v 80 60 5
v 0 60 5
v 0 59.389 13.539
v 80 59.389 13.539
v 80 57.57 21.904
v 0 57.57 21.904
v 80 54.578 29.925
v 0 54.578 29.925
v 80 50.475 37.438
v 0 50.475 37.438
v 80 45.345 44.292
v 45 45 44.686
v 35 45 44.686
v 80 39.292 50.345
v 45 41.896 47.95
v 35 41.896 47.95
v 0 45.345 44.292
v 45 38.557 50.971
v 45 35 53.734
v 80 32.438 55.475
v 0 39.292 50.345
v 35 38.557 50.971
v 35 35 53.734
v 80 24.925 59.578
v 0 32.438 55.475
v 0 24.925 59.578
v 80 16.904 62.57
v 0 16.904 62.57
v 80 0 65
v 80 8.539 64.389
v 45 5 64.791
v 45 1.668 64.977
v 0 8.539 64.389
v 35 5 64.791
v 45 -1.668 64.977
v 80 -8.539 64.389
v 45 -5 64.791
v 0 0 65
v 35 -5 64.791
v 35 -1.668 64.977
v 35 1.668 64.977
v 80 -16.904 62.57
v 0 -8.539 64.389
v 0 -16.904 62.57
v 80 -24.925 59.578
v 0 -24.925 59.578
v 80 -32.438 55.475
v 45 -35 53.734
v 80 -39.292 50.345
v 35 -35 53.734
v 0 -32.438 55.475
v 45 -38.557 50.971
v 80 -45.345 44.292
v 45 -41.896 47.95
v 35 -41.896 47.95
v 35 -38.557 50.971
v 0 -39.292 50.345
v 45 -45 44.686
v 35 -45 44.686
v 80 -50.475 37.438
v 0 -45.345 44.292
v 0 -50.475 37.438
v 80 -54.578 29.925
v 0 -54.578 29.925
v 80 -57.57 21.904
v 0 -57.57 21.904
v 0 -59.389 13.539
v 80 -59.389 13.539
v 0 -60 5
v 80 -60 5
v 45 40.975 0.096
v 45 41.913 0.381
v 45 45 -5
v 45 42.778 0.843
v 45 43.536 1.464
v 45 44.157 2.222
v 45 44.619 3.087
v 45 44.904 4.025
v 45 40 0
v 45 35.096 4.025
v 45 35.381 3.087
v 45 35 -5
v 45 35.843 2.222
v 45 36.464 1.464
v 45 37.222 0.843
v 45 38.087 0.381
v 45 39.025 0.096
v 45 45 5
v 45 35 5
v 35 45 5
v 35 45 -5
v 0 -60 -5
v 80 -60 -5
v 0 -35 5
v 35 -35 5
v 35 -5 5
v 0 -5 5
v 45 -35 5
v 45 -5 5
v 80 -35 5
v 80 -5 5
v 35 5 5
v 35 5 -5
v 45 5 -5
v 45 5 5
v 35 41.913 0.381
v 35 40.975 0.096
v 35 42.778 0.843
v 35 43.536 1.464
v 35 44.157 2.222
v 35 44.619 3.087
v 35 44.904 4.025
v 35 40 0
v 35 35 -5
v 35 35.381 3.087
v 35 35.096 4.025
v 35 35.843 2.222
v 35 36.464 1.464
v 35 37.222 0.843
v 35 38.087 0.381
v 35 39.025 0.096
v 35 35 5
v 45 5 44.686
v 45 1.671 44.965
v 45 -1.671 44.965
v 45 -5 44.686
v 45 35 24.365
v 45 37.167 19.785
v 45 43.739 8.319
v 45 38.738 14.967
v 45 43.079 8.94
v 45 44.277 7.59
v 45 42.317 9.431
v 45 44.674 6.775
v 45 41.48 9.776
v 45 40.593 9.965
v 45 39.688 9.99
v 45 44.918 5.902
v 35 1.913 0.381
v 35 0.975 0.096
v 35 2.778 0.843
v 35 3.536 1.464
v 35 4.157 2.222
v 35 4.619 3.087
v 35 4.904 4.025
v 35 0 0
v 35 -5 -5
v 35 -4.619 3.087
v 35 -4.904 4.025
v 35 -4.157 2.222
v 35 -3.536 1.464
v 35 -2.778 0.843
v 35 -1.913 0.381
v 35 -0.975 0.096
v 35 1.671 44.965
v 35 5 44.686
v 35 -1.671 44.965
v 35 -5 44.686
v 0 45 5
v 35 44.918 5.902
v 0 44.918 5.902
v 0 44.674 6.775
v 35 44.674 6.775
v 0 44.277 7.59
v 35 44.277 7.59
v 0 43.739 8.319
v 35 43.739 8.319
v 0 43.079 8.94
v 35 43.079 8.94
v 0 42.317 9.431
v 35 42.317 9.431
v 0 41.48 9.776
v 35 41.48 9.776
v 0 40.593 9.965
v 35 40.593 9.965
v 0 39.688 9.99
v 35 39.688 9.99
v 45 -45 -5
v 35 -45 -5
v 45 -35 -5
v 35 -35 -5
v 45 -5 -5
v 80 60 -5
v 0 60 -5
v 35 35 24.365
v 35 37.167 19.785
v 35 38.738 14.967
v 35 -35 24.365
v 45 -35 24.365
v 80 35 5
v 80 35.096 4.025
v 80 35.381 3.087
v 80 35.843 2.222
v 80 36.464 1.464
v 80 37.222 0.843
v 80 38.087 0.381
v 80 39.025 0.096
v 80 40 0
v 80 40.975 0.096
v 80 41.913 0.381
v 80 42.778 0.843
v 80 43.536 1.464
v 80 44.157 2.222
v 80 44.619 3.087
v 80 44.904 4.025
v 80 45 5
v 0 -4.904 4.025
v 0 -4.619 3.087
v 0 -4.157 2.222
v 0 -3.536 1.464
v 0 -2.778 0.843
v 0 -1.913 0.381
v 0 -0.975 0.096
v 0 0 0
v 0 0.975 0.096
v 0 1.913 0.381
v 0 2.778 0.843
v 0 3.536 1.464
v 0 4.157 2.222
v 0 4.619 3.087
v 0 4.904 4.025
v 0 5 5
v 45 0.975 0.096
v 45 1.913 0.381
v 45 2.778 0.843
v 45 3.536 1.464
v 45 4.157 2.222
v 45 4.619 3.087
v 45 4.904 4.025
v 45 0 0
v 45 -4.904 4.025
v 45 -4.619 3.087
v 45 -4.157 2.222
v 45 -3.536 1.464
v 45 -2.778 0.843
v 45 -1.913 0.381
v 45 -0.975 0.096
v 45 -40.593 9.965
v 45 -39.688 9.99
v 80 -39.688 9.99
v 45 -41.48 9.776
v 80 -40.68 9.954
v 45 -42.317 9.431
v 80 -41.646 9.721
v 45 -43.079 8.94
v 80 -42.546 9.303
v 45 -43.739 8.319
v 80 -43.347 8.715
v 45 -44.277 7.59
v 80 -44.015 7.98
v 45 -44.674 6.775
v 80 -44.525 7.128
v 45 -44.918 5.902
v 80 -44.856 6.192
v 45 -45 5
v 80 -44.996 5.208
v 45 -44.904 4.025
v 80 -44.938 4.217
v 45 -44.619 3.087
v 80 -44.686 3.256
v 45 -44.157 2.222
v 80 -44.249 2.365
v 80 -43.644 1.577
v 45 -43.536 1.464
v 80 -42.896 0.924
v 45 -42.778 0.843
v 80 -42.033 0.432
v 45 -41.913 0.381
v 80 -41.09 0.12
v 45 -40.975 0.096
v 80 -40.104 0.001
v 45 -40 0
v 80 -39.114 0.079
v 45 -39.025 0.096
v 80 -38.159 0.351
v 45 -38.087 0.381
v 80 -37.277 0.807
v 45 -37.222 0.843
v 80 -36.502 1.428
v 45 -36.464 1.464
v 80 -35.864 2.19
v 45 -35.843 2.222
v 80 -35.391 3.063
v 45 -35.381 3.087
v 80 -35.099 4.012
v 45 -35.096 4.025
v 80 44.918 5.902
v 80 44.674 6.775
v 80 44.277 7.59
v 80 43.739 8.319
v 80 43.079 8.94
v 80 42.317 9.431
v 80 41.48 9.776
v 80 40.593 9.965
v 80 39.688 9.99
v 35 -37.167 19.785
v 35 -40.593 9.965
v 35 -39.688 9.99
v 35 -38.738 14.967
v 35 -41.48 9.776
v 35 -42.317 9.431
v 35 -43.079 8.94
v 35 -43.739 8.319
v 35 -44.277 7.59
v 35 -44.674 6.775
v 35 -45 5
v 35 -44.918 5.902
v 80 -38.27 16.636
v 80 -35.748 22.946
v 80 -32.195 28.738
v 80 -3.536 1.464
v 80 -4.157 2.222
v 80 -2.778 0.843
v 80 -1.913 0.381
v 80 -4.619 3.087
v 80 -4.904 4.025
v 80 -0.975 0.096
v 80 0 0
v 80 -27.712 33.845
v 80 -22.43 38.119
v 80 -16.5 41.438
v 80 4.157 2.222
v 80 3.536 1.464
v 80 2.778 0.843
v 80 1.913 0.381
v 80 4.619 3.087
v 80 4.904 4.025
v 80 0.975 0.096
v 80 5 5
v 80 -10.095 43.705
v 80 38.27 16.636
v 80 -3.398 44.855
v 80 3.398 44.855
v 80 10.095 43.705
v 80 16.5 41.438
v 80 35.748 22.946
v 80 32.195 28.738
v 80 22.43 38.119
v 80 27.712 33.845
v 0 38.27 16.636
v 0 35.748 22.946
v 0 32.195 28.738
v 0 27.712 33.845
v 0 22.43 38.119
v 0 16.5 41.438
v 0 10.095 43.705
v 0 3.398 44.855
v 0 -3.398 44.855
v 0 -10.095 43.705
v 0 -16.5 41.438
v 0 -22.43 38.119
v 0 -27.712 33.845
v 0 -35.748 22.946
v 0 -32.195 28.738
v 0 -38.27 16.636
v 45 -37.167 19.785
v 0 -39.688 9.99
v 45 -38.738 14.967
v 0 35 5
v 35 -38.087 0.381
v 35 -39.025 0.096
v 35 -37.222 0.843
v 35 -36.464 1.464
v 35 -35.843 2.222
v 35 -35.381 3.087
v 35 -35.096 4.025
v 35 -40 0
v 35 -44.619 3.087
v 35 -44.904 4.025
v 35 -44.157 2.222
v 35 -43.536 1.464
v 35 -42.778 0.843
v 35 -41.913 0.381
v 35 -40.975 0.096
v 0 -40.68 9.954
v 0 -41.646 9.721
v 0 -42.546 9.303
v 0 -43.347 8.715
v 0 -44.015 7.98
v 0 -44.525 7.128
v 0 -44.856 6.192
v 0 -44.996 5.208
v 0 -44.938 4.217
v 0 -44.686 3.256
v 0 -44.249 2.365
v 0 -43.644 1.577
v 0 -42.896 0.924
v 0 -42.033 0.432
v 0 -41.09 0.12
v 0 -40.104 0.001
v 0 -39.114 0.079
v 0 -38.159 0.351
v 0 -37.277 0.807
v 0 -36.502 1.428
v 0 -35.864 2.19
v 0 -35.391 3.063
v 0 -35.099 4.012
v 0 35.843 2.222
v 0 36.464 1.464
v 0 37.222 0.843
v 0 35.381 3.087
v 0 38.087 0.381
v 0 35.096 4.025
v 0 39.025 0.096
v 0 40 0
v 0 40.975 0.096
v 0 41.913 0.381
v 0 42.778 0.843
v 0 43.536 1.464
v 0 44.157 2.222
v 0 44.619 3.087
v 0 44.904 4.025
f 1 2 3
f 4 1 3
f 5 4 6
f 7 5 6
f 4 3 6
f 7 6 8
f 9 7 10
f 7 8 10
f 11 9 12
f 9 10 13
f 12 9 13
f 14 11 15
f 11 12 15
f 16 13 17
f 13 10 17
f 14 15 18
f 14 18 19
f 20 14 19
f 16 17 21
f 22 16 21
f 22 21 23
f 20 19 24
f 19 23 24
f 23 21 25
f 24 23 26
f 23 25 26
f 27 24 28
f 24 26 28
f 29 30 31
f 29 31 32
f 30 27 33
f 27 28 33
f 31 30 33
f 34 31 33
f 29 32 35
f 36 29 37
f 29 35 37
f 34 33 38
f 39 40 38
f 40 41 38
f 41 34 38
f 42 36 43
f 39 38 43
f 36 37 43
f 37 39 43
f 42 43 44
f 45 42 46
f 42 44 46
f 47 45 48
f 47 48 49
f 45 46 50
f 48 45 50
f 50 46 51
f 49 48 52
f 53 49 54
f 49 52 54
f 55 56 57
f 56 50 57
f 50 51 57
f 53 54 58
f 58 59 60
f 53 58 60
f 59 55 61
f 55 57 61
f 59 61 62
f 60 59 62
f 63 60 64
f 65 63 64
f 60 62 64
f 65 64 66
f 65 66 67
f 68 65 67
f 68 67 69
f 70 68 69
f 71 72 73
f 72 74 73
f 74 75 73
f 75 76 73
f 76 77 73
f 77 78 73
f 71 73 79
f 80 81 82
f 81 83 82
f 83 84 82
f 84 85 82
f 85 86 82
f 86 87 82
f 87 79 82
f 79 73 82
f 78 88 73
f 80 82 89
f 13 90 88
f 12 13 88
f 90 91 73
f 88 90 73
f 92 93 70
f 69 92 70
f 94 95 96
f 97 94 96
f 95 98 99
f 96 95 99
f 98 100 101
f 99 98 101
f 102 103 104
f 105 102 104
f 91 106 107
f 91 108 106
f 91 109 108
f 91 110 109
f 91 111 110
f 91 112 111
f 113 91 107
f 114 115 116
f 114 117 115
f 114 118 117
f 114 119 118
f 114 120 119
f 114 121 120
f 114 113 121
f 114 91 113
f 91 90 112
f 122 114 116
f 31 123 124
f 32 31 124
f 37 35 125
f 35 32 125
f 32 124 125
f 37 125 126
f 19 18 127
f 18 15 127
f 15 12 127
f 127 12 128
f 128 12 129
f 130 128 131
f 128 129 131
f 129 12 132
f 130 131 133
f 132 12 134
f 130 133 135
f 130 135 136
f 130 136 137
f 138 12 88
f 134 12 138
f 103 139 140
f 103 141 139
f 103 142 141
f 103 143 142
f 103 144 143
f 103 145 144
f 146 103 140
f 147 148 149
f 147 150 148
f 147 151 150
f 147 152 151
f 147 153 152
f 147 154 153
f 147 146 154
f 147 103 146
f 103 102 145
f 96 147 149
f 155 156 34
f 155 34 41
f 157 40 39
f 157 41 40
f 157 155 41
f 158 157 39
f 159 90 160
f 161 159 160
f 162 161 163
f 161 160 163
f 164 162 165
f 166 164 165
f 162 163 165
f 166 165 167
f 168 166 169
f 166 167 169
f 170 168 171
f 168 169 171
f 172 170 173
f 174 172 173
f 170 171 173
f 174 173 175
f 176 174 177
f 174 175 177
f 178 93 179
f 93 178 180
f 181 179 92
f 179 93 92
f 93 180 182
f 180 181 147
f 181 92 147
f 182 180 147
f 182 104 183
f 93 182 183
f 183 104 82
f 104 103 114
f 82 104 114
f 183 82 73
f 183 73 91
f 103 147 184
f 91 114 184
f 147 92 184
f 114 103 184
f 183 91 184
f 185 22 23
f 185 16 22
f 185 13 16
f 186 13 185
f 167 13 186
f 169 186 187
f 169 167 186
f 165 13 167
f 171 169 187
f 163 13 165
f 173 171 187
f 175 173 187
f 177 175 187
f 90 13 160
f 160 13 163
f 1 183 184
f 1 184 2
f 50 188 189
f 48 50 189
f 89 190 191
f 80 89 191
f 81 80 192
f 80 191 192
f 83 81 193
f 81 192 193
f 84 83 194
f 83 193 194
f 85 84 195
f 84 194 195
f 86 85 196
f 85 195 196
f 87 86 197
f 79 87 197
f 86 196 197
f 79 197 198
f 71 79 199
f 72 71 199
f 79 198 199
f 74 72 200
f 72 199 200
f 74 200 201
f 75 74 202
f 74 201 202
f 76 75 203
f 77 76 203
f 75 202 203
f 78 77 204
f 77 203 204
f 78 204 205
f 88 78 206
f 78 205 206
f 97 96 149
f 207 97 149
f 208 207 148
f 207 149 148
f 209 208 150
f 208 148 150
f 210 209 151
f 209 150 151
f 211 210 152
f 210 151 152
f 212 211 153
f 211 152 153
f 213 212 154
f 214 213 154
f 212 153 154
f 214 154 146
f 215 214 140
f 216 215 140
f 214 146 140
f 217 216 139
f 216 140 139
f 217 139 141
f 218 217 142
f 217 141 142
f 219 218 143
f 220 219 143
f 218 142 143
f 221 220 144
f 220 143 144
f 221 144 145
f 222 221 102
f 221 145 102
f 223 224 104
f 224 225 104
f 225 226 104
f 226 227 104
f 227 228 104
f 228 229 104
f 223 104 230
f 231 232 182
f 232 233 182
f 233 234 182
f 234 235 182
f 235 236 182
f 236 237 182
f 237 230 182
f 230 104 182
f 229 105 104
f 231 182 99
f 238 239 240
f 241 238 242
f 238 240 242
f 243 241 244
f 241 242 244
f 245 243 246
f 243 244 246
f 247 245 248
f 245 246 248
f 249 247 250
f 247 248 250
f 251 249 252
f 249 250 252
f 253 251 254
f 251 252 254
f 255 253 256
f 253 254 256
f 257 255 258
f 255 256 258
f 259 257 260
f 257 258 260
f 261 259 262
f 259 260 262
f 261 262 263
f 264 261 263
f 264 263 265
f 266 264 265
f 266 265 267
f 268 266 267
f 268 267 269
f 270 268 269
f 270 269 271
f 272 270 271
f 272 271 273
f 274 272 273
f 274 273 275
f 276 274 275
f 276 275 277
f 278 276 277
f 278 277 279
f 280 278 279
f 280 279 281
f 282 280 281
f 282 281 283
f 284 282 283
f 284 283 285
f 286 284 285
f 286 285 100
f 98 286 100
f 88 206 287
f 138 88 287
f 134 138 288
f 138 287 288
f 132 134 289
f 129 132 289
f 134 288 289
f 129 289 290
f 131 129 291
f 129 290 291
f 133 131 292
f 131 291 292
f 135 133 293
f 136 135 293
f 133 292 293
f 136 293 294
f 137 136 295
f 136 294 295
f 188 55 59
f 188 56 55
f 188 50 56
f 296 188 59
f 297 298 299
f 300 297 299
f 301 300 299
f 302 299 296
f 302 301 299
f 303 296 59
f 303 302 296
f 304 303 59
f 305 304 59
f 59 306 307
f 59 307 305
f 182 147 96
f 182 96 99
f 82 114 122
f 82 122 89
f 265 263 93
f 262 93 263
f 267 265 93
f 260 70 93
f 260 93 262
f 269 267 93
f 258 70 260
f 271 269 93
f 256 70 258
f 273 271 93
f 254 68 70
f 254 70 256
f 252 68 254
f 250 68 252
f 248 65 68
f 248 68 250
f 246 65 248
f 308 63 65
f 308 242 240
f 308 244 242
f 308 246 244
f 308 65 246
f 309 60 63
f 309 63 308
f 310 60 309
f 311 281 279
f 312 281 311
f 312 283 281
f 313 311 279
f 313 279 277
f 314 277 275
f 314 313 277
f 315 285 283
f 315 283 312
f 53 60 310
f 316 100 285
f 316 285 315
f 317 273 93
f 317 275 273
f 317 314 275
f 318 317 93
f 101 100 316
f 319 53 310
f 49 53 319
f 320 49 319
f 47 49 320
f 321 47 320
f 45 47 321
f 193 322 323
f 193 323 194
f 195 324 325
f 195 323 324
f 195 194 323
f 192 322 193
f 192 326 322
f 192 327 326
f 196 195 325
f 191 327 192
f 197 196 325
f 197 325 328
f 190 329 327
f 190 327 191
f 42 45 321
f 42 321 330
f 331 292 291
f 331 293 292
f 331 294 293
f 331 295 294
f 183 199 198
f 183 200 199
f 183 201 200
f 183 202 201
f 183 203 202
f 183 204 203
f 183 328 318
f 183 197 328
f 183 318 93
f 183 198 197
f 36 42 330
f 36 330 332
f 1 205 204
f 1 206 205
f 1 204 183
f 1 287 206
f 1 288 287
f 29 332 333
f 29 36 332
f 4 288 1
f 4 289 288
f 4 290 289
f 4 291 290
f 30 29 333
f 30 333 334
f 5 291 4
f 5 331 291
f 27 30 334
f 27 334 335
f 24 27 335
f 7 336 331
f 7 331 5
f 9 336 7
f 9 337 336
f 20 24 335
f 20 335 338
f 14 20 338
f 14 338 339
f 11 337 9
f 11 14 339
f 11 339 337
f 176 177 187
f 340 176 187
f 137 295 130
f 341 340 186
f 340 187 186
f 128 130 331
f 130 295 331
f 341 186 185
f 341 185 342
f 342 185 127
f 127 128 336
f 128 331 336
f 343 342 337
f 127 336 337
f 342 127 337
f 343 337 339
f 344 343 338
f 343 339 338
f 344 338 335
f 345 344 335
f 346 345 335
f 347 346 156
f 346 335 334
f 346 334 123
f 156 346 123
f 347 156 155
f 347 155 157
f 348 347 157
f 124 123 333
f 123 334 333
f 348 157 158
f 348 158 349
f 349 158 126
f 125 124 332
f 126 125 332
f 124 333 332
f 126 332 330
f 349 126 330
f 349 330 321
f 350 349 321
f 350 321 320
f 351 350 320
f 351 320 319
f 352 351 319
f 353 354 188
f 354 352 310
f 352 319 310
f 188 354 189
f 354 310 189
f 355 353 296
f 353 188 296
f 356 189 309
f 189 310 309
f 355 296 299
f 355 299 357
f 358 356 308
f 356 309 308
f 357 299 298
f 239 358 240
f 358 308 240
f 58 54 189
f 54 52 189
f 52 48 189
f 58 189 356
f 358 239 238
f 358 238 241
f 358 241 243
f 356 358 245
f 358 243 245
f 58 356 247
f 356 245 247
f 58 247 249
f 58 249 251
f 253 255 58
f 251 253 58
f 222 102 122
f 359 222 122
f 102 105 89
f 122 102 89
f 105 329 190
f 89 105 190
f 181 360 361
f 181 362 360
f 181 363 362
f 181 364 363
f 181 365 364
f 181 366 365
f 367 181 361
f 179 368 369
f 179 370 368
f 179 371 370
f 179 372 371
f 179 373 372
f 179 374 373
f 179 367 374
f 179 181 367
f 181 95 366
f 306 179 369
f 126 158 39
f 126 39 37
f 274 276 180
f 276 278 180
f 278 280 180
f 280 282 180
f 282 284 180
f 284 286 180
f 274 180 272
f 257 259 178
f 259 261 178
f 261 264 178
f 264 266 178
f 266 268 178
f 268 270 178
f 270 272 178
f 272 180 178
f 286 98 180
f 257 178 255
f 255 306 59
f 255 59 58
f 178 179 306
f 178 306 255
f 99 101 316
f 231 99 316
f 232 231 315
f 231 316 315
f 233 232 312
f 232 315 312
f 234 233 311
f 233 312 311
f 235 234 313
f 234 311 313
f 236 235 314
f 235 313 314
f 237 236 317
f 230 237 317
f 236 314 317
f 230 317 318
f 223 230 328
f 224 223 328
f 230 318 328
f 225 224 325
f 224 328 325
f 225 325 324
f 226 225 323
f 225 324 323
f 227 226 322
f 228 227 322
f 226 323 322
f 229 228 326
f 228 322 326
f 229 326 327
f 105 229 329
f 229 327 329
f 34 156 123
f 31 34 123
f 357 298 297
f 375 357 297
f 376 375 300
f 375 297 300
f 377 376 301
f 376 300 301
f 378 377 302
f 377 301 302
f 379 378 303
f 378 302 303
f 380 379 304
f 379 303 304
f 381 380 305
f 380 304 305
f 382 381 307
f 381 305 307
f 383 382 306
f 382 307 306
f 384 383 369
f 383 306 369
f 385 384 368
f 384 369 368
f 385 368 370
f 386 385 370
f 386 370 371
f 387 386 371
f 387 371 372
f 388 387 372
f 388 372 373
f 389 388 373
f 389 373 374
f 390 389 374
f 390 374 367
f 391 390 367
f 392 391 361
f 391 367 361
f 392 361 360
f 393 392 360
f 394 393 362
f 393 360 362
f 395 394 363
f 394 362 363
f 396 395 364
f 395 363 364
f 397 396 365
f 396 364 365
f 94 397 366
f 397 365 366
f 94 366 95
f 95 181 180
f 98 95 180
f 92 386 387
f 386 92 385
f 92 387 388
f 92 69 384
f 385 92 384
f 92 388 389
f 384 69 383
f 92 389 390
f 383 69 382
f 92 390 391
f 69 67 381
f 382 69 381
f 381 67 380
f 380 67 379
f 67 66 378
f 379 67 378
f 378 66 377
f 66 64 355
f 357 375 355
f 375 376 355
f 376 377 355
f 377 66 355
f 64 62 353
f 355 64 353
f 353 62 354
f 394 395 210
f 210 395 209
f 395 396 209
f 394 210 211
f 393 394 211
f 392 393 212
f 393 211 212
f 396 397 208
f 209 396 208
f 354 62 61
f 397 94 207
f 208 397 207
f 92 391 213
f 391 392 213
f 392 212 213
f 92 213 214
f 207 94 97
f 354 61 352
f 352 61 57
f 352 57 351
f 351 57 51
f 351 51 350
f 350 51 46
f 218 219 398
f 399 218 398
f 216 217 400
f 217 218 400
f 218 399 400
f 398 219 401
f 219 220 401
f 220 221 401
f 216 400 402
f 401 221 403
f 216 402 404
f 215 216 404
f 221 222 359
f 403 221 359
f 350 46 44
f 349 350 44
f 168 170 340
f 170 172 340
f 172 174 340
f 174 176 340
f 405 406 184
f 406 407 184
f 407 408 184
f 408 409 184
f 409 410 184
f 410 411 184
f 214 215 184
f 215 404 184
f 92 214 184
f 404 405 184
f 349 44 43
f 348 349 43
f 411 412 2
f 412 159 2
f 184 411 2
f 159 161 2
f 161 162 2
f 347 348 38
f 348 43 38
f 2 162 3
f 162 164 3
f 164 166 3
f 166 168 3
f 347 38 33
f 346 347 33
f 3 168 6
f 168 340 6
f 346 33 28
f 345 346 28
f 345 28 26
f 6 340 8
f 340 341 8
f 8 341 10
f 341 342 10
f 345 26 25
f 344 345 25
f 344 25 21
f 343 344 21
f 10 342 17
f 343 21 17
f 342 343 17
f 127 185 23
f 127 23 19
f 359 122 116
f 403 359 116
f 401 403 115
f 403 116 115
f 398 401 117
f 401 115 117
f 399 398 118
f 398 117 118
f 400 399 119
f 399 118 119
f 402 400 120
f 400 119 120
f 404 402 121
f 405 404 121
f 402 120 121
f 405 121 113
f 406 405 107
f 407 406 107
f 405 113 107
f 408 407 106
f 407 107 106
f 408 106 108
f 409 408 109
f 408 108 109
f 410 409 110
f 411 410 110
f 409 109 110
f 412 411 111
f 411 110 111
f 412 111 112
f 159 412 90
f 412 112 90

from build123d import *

# Parameters (mm, degrees)
F0_W     = 120
F0_H     = 10
F1_DEPTH = 80
F3_DEPTH = 80.001
F4_DEPTH = 25
F5_W     = 10
F5_H     = 10
F6_DEPTH = 70.001


with BuildPart() as f1:
    # F0 (on Right) → F1 (new body)
    with BuildSketch(Plane.YZ):
        Rectangle(F0_W, F0_H)
        with BuildLine():
            ThreePointArc((60, 5), (0, 65), (-60, 5))
            Line((-60, 5), (60, 5))
        make_face()
    extrude(amount=F1_DEPTH)

    # F2 (on face) → F3 (cut, through all)
    with BuildSketch(Plane.YZ.offset(80)):
        with BuildLine():
            Line((-5, 5), (5, 5))
            ThreePointArc((5, 5), (0, 10), (-5, 5))
        make_face()
        with BuildLine():
            ThreePointArc((-5, 5), (0, 0), (5, 5))
            Line((5, 5), (-5, 5))
        make_face()
        with BuildLine():
            ThreePointArc((-5, 5), (0, 10), (5, 5))
            Line((5, 5), (35, 5))
            ThreePointArc((35, 5), (36.3556550657, 8.4232659844), (39.6875, 9.9902248196))
            ThreePointArc((39.6875, 9.9902248196), (0, 45), (-39.6875, 9.9902248196))
            ThreePointArc((-39.6875, 9.9902248196), (-36.3556550657, 8.4232659844), (-35, 5))
            Line((-35, 5), (-5, 5))
        make_face()
        with BuildLine():
            Line((40, 5), (35, 5))
            ThreePointArc((35, 5), (40, 0), (45, 5))
            ThreePointArc((45, 5), (43.4232659844, 8.6443449343), (39.6875, 9.9902248196))
            ThreePointArc((39.6875, 9.9902248196), (39.9217985567, 7.5), (40, 5))
        make_face()
        with BuildLine():
            ThreePointArc((39.6875, 9.9902248196), (36.3556550657, 8.4232659844), (35, 5))
            Line((35, 5), (40, 5))
            ThreePointArc((40, 5), (39.9217985567, 7.5), (39.6875, 9.9902248196))
        make_face()
        with BuildLine():
            Line((-40, 5), (-35, 5))
            ThreePointArc((-35, 5), (-36.3556550657, 8.4232659844), (-39.6875, 9.9902248196))
            ThreePointArc((-39.6875, 9.9902248196), (-39.9217985567, 7.5), (-40, 5))
        make_face()
        with BuildLine():
            ThreePointArc((-39.6875, 9.9902248196), (-43.6443449343, 1.5767340156), (-35, 5))
            Line((-35, 5), (-40, 5))
            ThreePointArc((-40, 5), (-39.9217985567, 7.5), (-39.6875, 9.9902248196))
        make_face()
    extrude(amount=-F3_DEPTH, mode=Mode.SUBTRACT)

    # F2 (on face) → F4 (cut)
    with BuildSketch(Plane.YZ.offset(80)):
        with BuildLine():
            Line((-5, 5), (5, 5))
            ThreePointArc((5, 5), (0, 10), (-5, 5))
        make_face()
        with BuildLine():
            ThreePointArc((-5, 5), (0, 0), (5, 5))
            Line((5, 5), (-5, 5))
        make_face()
        with BuildLine():
            ThreePointArc((-5, 5), (0, 10), (5, 5))
            Line((5, 5), (35, 5))
            ThreePointArc((35, 5), (36.3556550657, 8.4232659844), (39.6875, 9.9902248196))
            ThreePointArc((39.6875, 9.9902248196), (0, 45), (-39.6875, 9.9902248196))
            ThreePointArc((-39.6875, 9.9902248196), (-36.3556550657, 8.4232659844), (-35, 5))
            Line((-35, 5), (-5, 5))
        make_face()
        with BuildLine():
            Line((40, 5), (35, 5))
            ThreePointArc((35, 5), (40, 0), (45, 5))
            ThreePointArc((45, 5), (43.4232659844, 8.6443449343), (39.6875, 9.9902248196))
            ThreePointArc((39.6875, 9.9902248196), (39.9217985567, 7.5), (40, 5))
        make_face()
        with BuildLine():
            ThreePointArc((39.6875, 9.9902248196), (36.3556550657, 8.4232659844), (35, 5))
            Line((35, 5), (40, 5))
            ThreePointArc((40, 5), (39.9217985567, 7.5), (39.6875, 9.9902248196))
        make_face()
        with BuildLine():
            Line((-40, 5), (-35, 5))
            ThreePointArc((-35, 5), (-36.3556550657, 8.4232659844), (-39.6875, 9.9902248196))
            ThreePointArc((-39.6875, 9.9902248196), (-39.9217985567, 7.5), (-40, 5))
        make_face()
        with BuildLine():
            ThreePointArc((-39.6875, 9.9902248196), (-43.6443449343, 1.5767340156), (-35, 5))
            Line((-35, 5), (-40, 5))
            ThreePointArc((-40, 5), (-39.9217985567, 7.5), (-39.6875, 9.9902248196))
        make_face()
    extrude(amount=-F4_DEPTH, mode=Mode.SUBTRACT)

    # F5 (on face) → F6 (cut, through all)
    with BuildSketch(Plane(origin=(0, 0, -5), x_dir=(1, 0, 0), z_dir=(0, 0, -1))):
        with Locations((40, 40)):
            Rectangle(F5_W, F5_H)
        with Locations((40, 0)):
            Rectangle(F5_W, F5_H)
        with Locations((40, -40)):
            Rectangle(F5_W, F5_H)
    extrude(amount=-F6_DEPTH, mode=Mode.SUBTRACT)


solid = f1.part
